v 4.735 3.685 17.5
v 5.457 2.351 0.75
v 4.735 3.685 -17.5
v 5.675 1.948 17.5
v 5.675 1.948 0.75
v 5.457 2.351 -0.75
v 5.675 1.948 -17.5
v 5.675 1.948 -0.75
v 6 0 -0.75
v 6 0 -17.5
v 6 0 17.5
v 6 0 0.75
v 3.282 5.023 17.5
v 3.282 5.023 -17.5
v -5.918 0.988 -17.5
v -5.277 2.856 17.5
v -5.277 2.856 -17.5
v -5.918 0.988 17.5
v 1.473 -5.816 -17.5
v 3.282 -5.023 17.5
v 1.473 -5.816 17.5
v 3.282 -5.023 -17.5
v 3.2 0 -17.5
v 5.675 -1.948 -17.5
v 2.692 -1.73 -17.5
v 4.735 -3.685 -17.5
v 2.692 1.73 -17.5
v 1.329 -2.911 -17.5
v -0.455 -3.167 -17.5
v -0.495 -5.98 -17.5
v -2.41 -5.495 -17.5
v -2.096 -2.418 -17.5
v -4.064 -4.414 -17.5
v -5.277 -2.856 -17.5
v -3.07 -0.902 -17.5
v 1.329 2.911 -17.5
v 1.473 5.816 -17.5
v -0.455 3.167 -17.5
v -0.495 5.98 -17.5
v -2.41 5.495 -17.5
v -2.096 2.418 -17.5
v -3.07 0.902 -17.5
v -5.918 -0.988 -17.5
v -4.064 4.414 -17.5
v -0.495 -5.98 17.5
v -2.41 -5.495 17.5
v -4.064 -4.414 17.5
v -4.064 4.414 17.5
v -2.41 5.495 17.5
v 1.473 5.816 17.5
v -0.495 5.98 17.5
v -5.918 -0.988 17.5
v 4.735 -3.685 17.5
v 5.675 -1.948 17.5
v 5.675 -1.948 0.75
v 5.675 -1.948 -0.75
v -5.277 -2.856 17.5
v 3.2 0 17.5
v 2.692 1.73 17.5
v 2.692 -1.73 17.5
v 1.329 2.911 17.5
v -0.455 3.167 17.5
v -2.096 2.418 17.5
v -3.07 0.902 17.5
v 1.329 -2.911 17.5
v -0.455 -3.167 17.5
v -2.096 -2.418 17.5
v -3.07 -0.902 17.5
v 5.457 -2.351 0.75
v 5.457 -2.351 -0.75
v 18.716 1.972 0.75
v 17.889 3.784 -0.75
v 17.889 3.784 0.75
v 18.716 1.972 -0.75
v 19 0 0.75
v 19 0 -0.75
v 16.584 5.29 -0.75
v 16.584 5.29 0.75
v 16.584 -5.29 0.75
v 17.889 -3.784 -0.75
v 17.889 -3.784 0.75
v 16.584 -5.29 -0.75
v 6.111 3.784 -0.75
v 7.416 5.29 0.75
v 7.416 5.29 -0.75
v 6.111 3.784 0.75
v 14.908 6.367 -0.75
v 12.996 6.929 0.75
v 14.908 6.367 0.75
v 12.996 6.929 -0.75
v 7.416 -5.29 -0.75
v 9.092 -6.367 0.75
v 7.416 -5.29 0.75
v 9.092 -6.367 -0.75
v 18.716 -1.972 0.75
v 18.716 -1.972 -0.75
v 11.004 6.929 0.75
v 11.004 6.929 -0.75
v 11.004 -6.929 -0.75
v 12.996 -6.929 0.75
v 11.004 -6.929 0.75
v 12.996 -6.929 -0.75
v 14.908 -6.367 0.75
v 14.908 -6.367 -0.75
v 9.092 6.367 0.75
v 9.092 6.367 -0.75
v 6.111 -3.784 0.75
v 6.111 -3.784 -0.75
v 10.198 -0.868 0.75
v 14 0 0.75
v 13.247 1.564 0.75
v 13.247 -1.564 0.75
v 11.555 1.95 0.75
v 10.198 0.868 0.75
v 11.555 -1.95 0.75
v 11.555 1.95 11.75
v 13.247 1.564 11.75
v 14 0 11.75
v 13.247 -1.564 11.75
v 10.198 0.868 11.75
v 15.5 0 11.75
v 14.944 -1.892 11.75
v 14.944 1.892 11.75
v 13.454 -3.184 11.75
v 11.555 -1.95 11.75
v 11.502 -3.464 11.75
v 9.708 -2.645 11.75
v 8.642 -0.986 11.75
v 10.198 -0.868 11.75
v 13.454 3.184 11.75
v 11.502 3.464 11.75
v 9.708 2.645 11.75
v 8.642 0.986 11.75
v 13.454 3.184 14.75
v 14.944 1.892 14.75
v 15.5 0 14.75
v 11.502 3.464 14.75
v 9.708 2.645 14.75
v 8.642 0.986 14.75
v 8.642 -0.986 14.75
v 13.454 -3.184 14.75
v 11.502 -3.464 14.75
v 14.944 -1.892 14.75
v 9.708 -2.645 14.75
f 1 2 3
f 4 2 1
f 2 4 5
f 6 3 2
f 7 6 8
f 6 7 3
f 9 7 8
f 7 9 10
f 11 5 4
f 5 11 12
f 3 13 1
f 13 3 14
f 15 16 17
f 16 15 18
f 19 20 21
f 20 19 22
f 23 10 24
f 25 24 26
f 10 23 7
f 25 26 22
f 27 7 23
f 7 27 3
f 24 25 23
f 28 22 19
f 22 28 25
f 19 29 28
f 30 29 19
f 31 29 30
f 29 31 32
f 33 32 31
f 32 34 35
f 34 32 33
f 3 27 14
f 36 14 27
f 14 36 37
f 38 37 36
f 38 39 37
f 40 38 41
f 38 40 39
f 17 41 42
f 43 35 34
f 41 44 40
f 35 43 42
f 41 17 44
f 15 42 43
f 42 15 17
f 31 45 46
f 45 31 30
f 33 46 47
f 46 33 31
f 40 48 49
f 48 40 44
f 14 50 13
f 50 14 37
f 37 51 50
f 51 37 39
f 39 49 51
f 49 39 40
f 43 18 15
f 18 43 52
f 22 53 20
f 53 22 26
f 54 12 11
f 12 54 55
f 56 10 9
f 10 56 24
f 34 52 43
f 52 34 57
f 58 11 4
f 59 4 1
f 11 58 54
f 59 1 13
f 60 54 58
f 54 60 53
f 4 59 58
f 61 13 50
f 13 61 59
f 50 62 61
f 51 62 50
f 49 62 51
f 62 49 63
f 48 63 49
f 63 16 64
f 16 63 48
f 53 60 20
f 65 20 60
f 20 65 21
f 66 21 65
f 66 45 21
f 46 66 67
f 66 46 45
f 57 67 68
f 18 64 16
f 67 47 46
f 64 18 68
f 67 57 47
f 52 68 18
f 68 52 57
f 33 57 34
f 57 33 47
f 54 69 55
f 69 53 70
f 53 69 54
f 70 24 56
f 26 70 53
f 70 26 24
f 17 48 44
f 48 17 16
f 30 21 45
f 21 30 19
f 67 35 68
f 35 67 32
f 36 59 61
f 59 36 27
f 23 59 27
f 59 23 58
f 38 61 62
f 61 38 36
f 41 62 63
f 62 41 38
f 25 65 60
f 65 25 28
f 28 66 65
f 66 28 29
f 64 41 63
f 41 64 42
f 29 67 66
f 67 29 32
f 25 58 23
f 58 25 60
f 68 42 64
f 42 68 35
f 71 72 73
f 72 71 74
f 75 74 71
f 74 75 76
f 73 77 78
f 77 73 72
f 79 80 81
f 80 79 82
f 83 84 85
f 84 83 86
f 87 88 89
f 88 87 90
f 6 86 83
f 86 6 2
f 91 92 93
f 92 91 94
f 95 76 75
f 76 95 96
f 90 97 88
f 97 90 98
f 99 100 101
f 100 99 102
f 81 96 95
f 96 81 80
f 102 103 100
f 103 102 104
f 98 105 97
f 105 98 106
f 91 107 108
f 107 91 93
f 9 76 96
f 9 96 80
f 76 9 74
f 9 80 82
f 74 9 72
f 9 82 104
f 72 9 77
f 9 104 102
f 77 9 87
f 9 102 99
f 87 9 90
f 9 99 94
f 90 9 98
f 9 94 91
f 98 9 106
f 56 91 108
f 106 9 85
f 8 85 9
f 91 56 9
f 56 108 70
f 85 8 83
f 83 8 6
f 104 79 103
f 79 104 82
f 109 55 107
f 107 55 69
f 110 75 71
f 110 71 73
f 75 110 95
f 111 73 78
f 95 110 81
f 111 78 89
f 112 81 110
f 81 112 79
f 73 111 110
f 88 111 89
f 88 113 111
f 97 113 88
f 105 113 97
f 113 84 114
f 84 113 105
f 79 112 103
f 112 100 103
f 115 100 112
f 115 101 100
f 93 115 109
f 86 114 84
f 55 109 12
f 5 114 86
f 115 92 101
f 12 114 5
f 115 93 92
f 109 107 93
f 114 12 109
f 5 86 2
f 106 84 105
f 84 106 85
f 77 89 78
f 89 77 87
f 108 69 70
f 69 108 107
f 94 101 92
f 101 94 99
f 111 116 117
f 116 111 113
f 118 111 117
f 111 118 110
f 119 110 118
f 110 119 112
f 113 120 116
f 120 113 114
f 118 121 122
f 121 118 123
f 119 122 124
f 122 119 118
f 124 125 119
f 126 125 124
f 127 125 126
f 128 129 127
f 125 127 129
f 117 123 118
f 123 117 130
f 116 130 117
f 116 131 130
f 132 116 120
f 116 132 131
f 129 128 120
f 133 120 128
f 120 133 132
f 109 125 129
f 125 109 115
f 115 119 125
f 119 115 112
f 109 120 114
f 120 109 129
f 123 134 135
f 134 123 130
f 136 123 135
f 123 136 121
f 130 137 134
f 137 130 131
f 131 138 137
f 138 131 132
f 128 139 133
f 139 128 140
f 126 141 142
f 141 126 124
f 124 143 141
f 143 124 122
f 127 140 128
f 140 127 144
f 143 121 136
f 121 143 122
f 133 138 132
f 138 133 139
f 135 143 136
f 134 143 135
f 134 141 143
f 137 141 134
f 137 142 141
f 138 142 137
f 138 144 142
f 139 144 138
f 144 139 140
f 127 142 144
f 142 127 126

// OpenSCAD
// Parameters
bore_diameter_mm = 6; //[3:12:0.1]
outer_diameter_mm = 12; //[6:24:0.1]
length_mm = 35; //[18:70:0.5]
bore_radius_mm = 3; //[1.5:6:0.1]
outer_radius_mm = 6; //[3:12:0.1]
fit_clearance_mm = 0.2; //[0:0.6:0.05]
connect_overlap_mm = 1; //[0.5:2:0.1]
washer_outer_diameter_mm = 14; //[8:28:0.5]
washer_thickness_mm = 1.5; //[0.8:4:0.1]
screw_shank_diameter_mm = 4; //[2:8:0.1]
screw_length_mm = 12; //[6:30:0.5]
screw_head_diameter_mm = 7; //[4:14:0.1]
screw_head_height_mm = 3; //[1.5:8:0.1]

// Linear Bearing - complete geometry
module linear_bearing() {
  color("Silver") {
    difference() {
      // Outer cylinder
      cylinder(h=length_mm, r=outer_diameter_mm/2, center=true);
      // Through bore
      cylinder(h=length_mm + 2*connect_overlap_mm, r=bore_diameter_mm/2 + fit_clearance_mm, center=true);
    }
  }
}

// Screw and Washer - complete geometry
module screw_and_washer() {
  color("DimGray") {
    union() {
      // Washer
      translate([outer_diameter_mm/2 + washer_outer_diameter_mm/2 - connect_overlap_mm, 0, 0])
        cylinder(h=washer_thickness_mm, r=washer_outer_diameter_mm/2, center=true);
      
      // Screw shank
      translate([outer_diameter_mm/2 + washer_outer_diameter_mm/2 - connect_overlap_mm, 0, washer_thickness_mm/2 + screw_length_mm/2 - connect_overlap_mm])
        cylinder(h=screw_length_mm, r=screw_shank_diameter_mm/2, center=true);
      
      // Screw head
      translate([outer_diameter_mm/2 + washer_outer_diameter_mm/2 - connect_overlap_mm, 0, washer_thickness_mm/2 + screw_length_mm - connect_overlap_mm + screw_head_height_mm/2])
        cylinder(h=screw_head_height_mm, r=screw_head_diameter_mm/2, center=true);
    }
  }
}

// Assembly
module assembly() {
  linear_bearing();
  screw_and_washer();
}

assembly();
